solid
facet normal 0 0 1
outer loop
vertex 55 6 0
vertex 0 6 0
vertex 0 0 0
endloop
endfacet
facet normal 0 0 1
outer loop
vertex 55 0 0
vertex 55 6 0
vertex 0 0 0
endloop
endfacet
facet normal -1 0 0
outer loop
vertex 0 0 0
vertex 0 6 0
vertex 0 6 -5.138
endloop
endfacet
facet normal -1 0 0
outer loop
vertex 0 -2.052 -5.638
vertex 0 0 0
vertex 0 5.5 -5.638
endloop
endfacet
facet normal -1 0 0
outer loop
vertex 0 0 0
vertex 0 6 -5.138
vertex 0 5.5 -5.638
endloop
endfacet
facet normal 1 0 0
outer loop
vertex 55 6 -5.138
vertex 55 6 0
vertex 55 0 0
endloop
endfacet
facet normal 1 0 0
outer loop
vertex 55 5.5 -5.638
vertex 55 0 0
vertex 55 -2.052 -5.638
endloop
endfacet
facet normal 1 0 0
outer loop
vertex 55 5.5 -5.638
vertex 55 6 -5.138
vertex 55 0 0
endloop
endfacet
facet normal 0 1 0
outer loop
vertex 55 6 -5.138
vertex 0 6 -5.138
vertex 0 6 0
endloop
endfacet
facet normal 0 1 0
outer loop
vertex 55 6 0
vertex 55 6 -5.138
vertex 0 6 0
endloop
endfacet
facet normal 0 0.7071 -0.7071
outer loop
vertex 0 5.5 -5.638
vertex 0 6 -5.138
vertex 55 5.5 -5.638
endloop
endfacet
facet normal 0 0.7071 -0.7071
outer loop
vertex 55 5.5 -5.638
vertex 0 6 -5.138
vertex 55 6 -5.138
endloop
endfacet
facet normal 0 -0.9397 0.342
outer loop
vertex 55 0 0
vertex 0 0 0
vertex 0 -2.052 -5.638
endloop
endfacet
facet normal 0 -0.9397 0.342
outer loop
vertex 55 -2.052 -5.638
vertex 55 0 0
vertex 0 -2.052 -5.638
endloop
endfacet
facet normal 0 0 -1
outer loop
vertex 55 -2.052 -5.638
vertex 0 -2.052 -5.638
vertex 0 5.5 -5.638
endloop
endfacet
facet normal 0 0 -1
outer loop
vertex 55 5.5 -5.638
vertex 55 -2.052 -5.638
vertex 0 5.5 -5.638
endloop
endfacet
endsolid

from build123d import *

# Parameters (mm, degrees)
EXTRUDE_1_DEPTH = 55
CHAMFER_1_SIZE  = 0.5


with BuildPart() as part:
    # 草图1 → 凸台-拉伸1 (new body)
    with BuildSketch(Plane(origin=(0, 0, 0), x_dir=(0, 0, -1), z_dir=(1, 0, 0))):
        Polygon((0, 6), (0, 0), (5.638155725, -2.05212086), (5.638155725, 6), align=None)
    extrude(amount=EXTRUDE_1_DEPTH)

    # 倒角1
    chamfer_1_edges = [part.edges().sort_by_distance(p)[0] for p in [
        (27.5, 6, -5.638155725),
    ]]
    chamfer(chamfer_1_edges, length=CHAMFER_1_SIZE)


solid = part.part
